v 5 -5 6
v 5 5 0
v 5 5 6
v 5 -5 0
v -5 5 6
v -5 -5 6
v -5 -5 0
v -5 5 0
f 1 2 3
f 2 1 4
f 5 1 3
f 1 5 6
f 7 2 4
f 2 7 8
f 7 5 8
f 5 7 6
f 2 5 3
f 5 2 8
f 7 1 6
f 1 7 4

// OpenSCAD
// file: ../machine.scad
/*
 * Helpers for machinging; i.e. kerf alowances
 *
 * Copyright 2013 <b@Zi.iS>
 * License CC BY 3.0
 */

include <main.scad>;

ZCUT = 0;
XOFF = 0;
YOFF = 0;

module drawing() {
	//create blueprint
	if(preview==0) {
		projection(cut=true) translate([
			XOFF,
			YOFF,
			ZCUT
		]) {
			for(i=[0:$children-1]) child(i);
		}
	} else {
		for(i=[0:$children-1]) child(i);
	}
}

module kerf_cube(
	size
) {
	translate([
		kerf/2*(1-preview),
		kerf/2*(1-preview),
		0
	]) {
		cube([
			size[0] - kerf*(1-preview),
			size[1] - kerf*(1-preview),
			size[2]
		]);
	}
}

module kerf_cylinder(
	r,
	h
) {
	cylinder(
		r = r - kerf/2*(1-preview),
		h = h
	);
}

module part(
	id,
	name
) {
	if(PART<1 || PART==id) {
		echo(str("PART", id, ":", name));
		for(i=[0:$children-1]) child(i);
	}	
}
// file: ../easing.scad
/*
 * Make allowances to ensure good fit.
 *
 * Copyright 2013 <b@Zi.iS>
 * License CC BY 3.0
 */

function ease(value) = min(value*1.1, value + .2);
// file: ../epslion.scad
/*
 * Slightly offset previews to overcome rounding issues
 *
 * Copyright 2013 <b@Zi.iS>
 * License CC BY 3.0
 */

include <config.scad>;

module e(
	shift = -.1,
	size = 1.1
) {
	if(preview == 1) {
		translate([
			0,
			0,
			shift
		]) {
			scale([
				1,
				1,
				size
			]) {
				if($children>0) for (i = [0 : $children-1]) child(i);
			}
		}
	} else {
		if($children>0) for (i = [0 : $children-1]) child(i);
	}
}
// file: ../config.scad
/*
 * Default settings
 *
 * Copyright 2013 <b@Zi.iS>
 * License CC BY 3.0
 */

preview = 1;
$fa = 6;
$fs = 2 - 1.5*(1-preview);
kerf = .2;
PART = 0; //all

// preview colors
color_steel = [.8, .8, .8];
color_wood = [.3, .3, 0];
color_print = [0, .8, 0];
color_plastic = [.7, 1, .7];
// file: ../main.scad
/*
 * A library to make SCAD easier.
 *
 * Copyright 2013 <b@Zi.iS>
 * License CC BY 3.0
 */

include <config.scad>;
use <epslion.scad>;
use <easing.scad>;
use <machine.scad>;
// main file
/*
 * MDF
 *
 * Copyright 2013 <b@Zi.iS>
 * License CC BY 3.0
 */

include <../main.scad>;

2d();

module 2d(
	size = [10, 10],
    material = [
        6,
        "MDF",
        color_wood
    ],
    drill = [0, 0, 0, 0],
    drill_offset = [[0, 0], [0, 0], [0, 0], [0, 0]],
	id
) {
    if($children!=1) {
        echo("ERROR: Openscad's $children bug means this must have exactly 1 child");
    }
	part(id, str(material[0], "mm ", material[1], " ", size[0] + kerf*(1-preview), "x", size[1] + kerf*(1-preview), "mm"))
	drawing()
   	difference() {
    	translate([
    		-size[0]/2,
    		-size[1]/2,
    		0
    	] * preview) {
			color(material[2]) cube([
				size[0] + kerf*(1-preview),
				size[1] + kerf*(1-preview),
				material[0]
			]);
        }
        translate([
            size[0]/2 + kerf/2,
            size[1]/2 + kerf/2,
            0
        ] * (1-preview)) {
    		if($children>0) for (i = [0:$children-1]) e() child(i);
        }
        for(x=[0,1]) {
            for(y=[0,1]) {
                if(drill[2*x + y] > 0) {
                    translate([
                        (size[0]/2 - material[0]/2)*(2*x-1) + drill_offset[2*x + y][0],
                        (size[1]/2 - material[0]/2)*(2*y-1) + drill_offset[2*x + y][1],
                        0
                    ]) {
                        #kerf_cylinder(
                            r = drill[2*x + y]/2,
                            h = material[0]      
                        );
                    }
                }
            }
        }
	}
}

module 2d_cylinder(
	size = 10,
    material = [
        6,
        "MDF",
        color_wood
    ],
    id
) {
	part(id, str(material[0], "mm ", material[1], " ", size*2+ kerf*(1-preview), "x", size*2+ kerf*(1-preview), "mm"))
    if($children!=1) {
        echo("ERROR: Openscad's $children bug means this must have exactly 1 child");
    }
	drawing()
	translate([
		size + kerf/2,
		size + kerf/2,
		0
	] * (1-preview)) {
    	difference() {
    		color(material[2]) cylinder(
	    		r = size + kerf/2,
		    	h = material[0]
    		);
    		if($children>0) for (i = [0:$children-1]) e() child(i);
        }
	}
}
